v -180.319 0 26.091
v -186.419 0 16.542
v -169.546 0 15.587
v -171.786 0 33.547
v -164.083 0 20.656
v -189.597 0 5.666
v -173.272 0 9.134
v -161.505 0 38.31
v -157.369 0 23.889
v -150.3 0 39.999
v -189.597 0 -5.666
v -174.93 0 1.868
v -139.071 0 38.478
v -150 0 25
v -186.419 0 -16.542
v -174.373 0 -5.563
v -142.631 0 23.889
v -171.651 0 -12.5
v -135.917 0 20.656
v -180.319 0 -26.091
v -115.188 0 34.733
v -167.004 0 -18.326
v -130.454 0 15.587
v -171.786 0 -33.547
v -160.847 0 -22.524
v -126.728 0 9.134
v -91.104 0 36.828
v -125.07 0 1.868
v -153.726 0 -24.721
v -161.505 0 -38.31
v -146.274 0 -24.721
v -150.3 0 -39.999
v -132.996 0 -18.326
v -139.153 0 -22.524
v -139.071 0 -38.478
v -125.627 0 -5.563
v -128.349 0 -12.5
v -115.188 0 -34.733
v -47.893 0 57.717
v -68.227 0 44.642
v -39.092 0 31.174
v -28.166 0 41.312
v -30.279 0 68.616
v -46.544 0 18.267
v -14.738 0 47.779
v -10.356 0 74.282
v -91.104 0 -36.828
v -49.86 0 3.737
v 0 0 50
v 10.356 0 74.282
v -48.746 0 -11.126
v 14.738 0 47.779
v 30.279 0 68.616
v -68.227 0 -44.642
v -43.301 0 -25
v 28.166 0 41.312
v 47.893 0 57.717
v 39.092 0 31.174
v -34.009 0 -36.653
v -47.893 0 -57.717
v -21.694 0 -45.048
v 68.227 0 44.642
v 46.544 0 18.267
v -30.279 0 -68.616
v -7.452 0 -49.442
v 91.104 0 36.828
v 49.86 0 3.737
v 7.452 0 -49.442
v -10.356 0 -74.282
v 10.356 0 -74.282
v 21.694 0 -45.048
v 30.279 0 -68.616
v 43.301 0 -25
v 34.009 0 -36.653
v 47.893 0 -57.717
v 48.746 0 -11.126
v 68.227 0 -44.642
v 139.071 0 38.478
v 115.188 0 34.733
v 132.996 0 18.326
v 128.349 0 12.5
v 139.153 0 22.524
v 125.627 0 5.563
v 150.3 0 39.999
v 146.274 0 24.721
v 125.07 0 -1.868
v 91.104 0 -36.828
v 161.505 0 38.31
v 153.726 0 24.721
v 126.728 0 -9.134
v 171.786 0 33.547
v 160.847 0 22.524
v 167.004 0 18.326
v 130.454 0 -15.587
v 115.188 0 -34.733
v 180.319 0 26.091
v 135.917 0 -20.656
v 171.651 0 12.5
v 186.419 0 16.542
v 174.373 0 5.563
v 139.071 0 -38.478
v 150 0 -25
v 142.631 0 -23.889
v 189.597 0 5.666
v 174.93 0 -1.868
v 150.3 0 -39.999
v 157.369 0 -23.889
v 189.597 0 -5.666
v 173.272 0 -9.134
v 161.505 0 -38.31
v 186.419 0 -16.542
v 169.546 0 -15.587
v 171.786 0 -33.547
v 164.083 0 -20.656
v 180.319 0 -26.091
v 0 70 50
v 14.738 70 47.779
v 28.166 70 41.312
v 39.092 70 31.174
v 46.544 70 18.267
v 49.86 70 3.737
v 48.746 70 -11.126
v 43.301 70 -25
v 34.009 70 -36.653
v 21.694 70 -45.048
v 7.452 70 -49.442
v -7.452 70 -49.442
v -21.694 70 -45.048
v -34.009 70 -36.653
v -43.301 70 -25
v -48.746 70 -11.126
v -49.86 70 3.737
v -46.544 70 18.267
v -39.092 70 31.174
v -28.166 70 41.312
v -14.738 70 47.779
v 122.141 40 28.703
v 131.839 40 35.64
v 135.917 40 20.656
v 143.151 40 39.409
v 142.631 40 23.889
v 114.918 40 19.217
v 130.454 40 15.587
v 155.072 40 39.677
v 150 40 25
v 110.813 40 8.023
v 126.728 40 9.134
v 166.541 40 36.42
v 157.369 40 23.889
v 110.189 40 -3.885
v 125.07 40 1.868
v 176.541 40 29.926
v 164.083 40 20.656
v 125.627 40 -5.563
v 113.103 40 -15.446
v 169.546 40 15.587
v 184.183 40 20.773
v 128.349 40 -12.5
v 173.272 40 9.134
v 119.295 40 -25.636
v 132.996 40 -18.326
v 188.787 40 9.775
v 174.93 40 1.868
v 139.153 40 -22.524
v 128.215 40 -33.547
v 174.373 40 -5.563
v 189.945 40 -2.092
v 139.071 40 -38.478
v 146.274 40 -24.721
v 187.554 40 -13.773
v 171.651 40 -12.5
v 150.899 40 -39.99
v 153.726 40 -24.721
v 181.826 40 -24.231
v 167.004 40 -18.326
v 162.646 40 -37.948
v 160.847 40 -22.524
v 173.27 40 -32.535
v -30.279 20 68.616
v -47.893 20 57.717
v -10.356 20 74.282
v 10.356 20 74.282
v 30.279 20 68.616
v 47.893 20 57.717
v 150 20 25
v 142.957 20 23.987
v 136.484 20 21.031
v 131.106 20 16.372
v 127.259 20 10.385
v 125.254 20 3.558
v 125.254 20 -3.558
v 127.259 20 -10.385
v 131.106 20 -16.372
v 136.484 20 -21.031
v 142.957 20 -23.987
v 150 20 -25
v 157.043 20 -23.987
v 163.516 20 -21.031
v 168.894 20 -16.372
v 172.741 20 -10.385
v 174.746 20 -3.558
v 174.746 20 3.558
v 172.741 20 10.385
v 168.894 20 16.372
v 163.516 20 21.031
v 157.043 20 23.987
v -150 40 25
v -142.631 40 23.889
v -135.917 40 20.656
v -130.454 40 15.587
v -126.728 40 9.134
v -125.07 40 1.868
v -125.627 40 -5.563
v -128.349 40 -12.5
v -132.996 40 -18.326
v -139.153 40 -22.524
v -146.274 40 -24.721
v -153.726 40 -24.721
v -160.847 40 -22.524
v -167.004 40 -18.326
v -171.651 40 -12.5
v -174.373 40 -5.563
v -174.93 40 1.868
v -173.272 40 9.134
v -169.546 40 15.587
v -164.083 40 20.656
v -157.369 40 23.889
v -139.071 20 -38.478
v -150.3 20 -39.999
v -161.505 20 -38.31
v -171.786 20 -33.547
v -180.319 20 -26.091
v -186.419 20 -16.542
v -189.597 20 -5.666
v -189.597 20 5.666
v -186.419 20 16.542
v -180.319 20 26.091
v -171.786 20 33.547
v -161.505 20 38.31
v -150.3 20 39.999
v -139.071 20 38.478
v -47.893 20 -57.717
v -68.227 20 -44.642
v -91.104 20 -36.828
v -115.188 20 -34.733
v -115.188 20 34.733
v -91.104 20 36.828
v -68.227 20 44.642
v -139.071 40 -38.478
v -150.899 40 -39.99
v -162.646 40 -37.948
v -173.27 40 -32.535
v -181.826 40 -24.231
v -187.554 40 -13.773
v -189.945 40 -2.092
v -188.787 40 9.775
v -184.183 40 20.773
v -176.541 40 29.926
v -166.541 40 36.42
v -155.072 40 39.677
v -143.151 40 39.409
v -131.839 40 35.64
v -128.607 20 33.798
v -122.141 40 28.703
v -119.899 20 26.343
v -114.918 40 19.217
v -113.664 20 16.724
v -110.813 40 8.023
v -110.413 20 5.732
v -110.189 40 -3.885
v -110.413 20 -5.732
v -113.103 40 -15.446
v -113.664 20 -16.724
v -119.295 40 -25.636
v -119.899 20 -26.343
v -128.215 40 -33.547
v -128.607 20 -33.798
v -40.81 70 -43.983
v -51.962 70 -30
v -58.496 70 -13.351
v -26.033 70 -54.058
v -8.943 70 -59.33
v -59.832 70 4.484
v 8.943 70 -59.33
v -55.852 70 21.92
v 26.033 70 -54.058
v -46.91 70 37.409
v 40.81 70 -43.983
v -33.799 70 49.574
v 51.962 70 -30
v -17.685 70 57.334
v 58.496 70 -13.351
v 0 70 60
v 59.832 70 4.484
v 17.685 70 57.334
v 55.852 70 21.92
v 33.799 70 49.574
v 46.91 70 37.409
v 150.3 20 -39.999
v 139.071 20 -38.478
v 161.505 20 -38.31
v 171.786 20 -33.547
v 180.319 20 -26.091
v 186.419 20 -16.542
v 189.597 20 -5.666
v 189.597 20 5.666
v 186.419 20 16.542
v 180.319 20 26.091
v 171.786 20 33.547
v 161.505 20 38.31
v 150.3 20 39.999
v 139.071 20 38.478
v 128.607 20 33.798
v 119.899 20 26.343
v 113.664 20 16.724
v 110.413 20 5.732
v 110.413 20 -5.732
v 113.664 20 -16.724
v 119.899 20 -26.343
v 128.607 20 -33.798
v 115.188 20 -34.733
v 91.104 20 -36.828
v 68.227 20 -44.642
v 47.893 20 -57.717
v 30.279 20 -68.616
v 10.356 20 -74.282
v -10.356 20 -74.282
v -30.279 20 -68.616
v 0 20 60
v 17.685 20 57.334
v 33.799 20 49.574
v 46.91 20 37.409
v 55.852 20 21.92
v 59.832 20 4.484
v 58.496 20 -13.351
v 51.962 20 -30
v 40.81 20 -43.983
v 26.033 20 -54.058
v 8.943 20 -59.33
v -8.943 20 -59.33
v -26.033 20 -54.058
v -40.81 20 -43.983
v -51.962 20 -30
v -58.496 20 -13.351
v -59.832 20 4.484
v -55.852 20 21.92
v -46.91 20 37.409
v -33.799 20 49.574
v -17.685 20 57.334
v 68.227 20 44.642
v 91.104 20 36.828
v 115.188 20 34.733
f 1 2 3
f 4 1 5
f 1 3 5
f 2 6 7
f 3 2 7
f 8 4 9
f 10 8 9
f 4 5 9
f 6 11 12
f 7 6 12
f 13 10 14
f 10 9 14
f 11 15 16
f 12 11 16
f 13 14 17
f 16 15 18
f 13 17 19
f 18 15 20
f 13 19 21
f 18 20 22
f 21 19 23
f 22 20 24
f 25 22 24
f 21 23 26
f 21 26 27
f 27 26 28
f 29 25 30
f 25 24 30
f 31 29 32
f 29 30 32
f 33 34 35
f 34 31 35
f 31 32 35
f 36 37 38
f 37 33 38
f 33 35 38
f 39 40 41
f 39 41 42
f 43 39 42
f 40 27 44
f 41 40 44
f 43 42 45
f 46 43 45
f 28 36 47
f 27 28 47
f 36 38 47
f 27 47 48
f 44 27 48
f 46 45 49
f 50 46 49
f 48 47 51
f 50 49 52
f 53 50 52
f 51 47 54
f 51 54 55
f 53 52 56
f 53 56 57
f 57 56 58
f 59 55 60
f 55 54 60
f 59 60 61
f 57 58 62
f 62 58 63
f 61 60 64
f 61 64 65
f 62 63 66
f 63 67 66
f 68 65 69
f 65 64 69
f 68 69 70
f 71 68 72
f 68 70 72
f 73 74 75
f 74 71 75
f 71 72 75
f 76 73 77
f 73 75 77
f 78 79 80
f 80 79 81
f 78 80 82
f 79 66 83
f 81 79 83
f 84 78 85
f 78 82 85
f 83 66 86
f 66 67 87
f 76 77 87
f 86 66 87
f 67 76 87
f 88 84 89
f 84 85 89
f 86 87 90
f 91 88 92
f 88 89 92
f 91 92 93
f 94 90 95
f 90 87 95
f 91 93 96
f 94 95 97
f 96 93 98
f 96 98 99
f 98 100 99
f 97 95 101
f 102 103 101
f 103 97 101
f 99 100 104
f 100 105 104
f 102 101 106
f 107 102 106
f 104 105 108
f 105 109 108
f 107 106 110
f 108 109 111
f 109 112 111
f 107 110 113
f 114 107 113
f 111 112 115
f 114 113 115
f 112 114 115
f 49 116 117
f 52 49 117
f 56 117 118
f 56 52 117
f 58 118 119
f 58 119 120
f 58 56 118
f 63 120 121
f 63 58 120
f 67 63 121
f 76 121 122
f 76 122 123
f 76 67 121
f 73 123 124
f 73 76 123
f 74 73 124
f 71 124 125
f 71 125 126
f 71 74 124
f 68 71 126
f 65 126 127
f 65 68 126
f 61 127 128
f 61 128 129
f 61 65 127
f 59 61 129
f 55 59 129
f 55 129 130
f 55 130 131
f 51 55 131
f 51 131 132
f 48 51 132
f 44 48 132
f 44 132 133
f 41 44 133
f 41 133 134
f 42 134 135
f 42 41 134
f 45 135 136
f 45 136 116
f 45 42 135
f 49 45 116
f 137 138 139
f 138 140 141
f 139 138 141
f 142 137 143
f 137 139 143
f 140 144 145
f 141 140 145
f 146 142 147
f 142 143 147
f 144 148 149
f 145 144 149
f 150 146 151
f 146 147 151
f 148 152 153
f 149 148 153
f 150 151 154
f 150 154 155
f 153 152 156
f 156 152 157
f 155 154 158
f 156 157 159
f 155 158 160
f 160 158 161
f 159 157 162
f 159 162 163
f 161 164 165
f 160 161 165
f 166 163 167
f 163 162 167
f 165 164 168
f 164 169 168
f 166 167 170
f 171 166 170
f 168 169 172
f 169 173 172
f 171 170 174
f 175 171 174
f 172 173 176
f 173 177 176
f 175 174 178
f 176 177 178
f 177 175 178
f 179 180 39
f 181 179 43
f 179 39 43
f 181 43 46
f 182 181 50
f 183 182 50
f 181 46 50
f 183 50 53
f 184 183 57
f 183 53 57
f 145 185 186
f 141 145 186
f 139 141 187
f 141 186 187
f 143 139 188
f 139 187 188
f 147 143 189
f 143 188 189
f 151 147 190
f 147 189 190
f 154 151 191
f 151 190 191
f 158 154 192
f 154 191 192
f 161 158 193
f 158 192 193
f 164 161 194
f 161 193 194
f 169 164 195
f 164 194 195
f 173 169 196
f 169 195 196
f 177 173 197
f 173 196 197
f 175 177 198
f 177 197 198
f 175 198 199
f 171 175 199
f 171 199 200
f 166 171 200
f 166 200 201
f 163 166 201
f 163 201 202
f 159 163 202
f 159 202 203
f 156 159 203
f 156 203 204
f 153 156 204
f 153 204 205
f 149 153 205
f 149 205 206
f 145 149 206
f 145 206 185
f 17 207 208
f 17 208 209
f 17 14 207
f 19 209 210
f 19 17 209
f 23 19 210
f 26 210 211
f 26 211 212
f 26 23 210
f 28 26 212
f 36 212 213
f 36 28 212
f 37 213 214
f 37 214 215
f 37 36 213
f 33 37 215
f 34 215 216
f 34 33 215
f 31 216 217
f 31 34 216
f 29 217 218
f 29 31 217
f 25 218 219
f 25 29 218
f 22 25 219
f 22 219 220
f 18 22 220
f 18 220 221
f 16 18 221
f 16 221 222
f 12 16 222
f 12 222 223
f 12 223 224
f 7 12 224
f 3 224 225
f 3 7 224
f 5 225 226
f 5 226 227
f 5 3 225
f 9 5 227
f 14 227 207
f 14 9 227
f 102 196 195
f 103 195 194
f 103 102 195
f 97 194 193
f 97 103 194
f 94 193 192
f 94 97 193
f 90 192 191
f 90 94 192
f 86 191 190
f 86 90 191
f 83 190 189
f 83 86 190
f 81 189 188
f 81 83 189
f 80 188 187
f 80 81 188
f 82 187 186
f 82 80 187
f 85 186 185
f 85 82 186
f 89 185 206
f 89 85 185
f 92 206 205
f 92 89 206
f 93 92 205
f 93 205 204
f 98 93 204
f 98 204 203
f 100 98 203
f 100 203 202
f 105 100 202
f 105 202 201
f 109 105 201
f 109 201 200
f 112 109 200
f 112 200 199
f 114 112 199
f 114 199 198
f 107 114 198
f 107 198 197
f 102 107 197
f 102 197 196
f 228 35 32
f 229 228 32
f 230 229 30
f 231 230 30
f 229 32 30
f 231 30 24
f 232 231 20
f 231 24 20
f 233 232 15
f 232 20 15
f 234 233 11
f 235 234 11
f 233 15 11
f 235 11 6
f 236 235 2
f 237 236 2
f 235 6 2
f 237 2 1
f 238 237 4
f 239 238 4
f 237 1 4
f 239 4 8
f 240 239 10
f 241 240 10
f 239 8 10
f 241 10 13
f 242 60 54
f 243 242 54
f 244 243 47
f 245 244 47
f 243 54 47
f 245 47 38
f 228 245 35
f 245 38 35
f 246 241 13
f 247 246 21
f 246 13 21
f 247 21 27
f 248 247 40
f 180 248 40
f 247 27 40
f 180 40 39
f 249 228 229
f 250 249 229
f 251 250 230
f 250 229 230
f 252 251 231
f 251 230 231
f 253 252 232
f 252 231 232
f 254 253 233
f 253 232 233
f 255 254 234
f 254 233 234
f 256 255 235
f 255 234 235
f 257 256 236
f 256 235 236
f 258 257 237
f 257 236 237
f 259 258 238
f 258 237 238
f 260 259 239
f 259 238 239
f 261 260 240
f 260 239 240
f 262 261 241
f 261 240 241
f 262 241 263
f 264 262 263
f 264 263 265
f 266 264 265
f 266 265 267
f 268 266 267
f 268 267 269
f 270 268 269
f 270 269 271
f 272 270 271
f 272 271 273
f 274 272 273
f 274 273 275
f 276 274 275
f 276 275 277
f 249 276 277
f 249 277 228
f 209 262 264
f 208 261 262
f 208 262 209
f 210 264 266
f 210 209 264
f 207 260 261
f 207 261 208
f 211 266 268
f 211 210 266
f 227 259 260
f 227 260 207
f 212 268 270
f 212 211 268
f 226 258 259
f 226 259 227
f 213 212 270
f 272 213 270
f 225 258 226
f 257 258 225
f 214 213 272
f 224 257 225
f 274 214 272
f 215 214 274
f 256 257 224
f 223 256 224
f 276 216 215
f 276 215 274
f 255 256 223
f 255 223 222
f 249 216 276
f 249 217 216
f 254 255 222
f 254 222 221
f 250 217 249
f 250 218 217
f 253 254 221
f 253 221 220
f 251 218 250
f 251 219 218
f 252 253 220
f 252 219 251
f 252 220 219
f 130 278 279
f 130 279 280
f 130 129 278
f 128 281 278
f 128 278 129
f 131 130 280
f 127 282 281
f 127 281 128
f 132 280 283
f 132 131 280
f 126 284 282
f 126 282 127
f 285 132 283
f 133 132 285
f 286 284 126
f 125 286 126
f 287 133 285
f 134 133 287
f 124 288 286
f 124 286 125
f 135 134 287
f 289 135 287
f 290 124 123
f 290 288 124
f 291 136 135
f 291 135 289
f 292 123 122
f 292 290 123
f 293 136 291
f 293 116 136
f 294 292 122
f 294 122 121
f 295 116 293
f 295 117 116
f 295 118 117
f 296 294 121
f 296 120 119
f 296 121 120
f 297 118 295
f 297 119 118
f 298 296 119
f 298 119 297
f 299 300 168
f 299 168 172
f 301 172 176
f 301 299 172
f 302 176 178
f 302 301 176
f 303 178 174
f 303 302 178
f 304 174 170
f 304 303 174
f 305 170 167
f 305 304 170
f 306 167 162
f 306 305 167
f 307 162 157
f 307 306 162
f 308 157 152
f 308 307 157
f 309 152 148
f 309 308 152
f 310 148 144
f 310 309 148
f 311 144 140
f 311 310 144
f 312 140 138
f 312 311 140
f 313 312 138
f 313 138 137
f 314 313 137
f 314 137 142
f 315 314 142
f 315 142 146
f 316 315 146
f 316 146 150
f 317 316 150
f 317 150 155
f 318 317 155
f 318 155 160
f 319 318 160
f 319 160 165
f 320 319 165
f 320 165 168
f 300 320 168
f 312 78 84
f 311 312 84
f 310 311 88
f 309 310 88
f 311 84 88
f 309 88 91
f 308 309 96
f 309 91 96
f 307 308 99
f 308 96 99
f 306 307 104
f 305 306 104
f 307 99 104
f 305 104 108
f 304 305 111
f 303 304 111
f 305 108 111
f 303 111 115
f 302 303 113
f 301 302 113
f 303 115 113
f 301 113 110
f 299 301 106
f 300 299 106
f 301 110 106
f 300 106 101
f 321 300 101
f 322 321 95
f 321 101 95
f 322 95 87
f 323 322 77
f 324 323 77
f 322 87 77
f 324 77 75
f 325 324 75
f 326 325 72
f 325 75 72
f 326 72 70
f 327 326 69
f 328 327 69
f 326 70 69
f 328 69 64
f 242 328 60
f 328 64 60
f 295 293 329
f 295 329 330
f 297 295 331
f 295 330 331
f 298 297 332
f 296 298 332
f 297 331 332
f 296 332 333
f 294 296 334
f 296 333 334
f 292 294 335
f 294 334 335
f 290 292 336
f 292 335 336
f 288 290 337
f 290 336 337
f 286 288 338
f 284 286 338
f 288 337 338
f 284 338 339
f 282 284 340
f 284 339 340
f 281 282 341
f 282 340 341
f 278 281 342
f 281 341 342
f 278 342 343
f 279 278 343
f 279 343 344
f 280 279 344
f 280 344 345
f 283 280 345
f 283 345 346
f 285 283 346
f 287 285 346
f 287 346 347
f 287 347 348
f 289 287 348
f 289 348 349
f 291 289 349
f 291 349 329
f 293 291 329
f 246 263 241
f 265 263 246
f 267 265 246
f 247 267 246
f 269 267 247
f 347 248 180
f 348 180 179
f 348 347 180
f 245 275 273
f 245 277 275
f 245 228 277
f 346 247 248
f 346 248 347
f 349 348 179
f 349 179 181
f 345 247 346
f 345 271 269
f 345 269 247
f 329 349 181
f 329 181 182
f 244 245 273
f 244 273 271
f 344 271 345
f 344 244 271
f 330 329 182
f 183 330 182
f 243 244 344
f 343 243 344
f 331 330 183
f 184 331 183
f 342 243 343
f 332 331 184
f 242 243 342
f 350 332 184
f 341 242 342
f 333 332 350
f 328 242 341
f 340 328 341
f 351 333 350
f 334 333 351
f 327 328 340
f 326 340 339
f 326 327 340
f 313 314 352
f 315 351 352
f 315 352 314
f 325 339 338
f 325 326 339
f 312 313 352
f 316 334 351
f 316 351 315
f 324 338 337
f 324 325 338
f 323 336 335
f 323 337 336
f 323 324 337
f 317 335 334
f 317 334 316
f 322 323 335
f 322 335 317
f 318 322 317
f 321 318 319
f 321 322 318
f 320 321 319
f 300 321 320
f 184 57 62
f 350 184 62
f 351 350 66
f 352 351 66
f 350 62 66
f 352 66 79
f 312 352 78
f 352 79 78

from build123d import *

# Parameters (mm, degrees)
SKETCH1_R           = 60
SKETCH1_R_2         = 25
BOSS_EXTRUDE2_DEPTH = 20
SKETCH1_7_R         = 60
SKETCH1_7_R_2       = 50
BOSS_EXTRUDE3_DEPTH = 70
SKETCH3_R           = 40
SKETCH3_R_2         = 25
BOSS_EXTRUDE4_DEPTH = 20


with BuildPart() as part:
    # Sketch1 → Boss-Extrude2 (new body)
    with BuildSketch(Plane(origin=(0, 0, 0), x_dir=(1, 0, 0), z_dir=(0, 1, 0))):
        with BuildLine():
            ThreePointArc((-139.071428571, 38.478127898), (-190, 0), (-139.071428571, -38.478127898))
            ThreePointArc((-139.071428571, -38.478127898), (-91.104177178, -36.827906099), (-47.892857143, -57.717191847))
            ThreePointArc((-47.892857143, -57.717191847), (0, -75), (47.892857143, -57.717191847))
            ThreePointArc((47.892857143, -57.717191847), (91.104177178, -36.827906099), (139.071428571, -38.478127898))
            ThreePointArc((139.071428571, -38.478127898), (190, 0), (139.071428571, 38.478127898))
            ThreePointArc((139.071428571, 38.478127898), (91.104177178, 36.827906099), (47.892857143, 57.717191847))
            ThreePointArc((47.892857143, 57.717191847), (0, 75), (-47.892857143, 57.717191847))
            ThreePointArc((-47.892857143, 57.717191847), (-91.104177178, 36.827906099), (-139.071428571, 38.478127898))
        make_face()
        Circle(SKETCH1_R, mode=Mode.SUBTRACT)
        with Locations((-150, 0)):
            Circle(SKETCH1_R_2, mode=Mode.SUBTRACT)
        with Locations((150, 0)):
            Circle(SKETCH1_R_2, mode=Mode.SUBTRACT)
    extrude(amount=BOSS_EXTRUDE2_DEPTH)

    # Sketch1<7> → Boss-Extrude3 (add)
    with BuildSketch(Plane(origin=(0, 0, 0), x_dir=(1, 0, 0), z_dir=(0, 1, 0))):
        Circle(SKETCH1_7_R)
        Circle(SKETCH1_7_R_2, mode=Mode.SUBTRACT)
    extrude(amount=BOSS_EXTRUDE3_DEPTH)

    # Sketch3 → Boss-Extrude4 (add)
    with BuildSketch(Plane(origin=(0, 20, 0), x_dir=(1, 0, 0), z_dir=(0, 1, 0))):
        with Locations((-150, 0)):
            Circle(SKETCH3_R)
        with Locations((-150, 0)):
            Circle(SKETCH3_R_2, mode=Mode.SUBTRACT)
    boss_extrude4 = extrude(amount=BOSS_EXTRUDE4_DEPTH)

    # Mirror1: Boss-Extrude4 across plane
    add(boss_extrude4.mirror(Plane(origin=(0, 0, 0), x_dir=(0, 0, 1), z_dir=(1, 0, 0))))


solid = part.part
